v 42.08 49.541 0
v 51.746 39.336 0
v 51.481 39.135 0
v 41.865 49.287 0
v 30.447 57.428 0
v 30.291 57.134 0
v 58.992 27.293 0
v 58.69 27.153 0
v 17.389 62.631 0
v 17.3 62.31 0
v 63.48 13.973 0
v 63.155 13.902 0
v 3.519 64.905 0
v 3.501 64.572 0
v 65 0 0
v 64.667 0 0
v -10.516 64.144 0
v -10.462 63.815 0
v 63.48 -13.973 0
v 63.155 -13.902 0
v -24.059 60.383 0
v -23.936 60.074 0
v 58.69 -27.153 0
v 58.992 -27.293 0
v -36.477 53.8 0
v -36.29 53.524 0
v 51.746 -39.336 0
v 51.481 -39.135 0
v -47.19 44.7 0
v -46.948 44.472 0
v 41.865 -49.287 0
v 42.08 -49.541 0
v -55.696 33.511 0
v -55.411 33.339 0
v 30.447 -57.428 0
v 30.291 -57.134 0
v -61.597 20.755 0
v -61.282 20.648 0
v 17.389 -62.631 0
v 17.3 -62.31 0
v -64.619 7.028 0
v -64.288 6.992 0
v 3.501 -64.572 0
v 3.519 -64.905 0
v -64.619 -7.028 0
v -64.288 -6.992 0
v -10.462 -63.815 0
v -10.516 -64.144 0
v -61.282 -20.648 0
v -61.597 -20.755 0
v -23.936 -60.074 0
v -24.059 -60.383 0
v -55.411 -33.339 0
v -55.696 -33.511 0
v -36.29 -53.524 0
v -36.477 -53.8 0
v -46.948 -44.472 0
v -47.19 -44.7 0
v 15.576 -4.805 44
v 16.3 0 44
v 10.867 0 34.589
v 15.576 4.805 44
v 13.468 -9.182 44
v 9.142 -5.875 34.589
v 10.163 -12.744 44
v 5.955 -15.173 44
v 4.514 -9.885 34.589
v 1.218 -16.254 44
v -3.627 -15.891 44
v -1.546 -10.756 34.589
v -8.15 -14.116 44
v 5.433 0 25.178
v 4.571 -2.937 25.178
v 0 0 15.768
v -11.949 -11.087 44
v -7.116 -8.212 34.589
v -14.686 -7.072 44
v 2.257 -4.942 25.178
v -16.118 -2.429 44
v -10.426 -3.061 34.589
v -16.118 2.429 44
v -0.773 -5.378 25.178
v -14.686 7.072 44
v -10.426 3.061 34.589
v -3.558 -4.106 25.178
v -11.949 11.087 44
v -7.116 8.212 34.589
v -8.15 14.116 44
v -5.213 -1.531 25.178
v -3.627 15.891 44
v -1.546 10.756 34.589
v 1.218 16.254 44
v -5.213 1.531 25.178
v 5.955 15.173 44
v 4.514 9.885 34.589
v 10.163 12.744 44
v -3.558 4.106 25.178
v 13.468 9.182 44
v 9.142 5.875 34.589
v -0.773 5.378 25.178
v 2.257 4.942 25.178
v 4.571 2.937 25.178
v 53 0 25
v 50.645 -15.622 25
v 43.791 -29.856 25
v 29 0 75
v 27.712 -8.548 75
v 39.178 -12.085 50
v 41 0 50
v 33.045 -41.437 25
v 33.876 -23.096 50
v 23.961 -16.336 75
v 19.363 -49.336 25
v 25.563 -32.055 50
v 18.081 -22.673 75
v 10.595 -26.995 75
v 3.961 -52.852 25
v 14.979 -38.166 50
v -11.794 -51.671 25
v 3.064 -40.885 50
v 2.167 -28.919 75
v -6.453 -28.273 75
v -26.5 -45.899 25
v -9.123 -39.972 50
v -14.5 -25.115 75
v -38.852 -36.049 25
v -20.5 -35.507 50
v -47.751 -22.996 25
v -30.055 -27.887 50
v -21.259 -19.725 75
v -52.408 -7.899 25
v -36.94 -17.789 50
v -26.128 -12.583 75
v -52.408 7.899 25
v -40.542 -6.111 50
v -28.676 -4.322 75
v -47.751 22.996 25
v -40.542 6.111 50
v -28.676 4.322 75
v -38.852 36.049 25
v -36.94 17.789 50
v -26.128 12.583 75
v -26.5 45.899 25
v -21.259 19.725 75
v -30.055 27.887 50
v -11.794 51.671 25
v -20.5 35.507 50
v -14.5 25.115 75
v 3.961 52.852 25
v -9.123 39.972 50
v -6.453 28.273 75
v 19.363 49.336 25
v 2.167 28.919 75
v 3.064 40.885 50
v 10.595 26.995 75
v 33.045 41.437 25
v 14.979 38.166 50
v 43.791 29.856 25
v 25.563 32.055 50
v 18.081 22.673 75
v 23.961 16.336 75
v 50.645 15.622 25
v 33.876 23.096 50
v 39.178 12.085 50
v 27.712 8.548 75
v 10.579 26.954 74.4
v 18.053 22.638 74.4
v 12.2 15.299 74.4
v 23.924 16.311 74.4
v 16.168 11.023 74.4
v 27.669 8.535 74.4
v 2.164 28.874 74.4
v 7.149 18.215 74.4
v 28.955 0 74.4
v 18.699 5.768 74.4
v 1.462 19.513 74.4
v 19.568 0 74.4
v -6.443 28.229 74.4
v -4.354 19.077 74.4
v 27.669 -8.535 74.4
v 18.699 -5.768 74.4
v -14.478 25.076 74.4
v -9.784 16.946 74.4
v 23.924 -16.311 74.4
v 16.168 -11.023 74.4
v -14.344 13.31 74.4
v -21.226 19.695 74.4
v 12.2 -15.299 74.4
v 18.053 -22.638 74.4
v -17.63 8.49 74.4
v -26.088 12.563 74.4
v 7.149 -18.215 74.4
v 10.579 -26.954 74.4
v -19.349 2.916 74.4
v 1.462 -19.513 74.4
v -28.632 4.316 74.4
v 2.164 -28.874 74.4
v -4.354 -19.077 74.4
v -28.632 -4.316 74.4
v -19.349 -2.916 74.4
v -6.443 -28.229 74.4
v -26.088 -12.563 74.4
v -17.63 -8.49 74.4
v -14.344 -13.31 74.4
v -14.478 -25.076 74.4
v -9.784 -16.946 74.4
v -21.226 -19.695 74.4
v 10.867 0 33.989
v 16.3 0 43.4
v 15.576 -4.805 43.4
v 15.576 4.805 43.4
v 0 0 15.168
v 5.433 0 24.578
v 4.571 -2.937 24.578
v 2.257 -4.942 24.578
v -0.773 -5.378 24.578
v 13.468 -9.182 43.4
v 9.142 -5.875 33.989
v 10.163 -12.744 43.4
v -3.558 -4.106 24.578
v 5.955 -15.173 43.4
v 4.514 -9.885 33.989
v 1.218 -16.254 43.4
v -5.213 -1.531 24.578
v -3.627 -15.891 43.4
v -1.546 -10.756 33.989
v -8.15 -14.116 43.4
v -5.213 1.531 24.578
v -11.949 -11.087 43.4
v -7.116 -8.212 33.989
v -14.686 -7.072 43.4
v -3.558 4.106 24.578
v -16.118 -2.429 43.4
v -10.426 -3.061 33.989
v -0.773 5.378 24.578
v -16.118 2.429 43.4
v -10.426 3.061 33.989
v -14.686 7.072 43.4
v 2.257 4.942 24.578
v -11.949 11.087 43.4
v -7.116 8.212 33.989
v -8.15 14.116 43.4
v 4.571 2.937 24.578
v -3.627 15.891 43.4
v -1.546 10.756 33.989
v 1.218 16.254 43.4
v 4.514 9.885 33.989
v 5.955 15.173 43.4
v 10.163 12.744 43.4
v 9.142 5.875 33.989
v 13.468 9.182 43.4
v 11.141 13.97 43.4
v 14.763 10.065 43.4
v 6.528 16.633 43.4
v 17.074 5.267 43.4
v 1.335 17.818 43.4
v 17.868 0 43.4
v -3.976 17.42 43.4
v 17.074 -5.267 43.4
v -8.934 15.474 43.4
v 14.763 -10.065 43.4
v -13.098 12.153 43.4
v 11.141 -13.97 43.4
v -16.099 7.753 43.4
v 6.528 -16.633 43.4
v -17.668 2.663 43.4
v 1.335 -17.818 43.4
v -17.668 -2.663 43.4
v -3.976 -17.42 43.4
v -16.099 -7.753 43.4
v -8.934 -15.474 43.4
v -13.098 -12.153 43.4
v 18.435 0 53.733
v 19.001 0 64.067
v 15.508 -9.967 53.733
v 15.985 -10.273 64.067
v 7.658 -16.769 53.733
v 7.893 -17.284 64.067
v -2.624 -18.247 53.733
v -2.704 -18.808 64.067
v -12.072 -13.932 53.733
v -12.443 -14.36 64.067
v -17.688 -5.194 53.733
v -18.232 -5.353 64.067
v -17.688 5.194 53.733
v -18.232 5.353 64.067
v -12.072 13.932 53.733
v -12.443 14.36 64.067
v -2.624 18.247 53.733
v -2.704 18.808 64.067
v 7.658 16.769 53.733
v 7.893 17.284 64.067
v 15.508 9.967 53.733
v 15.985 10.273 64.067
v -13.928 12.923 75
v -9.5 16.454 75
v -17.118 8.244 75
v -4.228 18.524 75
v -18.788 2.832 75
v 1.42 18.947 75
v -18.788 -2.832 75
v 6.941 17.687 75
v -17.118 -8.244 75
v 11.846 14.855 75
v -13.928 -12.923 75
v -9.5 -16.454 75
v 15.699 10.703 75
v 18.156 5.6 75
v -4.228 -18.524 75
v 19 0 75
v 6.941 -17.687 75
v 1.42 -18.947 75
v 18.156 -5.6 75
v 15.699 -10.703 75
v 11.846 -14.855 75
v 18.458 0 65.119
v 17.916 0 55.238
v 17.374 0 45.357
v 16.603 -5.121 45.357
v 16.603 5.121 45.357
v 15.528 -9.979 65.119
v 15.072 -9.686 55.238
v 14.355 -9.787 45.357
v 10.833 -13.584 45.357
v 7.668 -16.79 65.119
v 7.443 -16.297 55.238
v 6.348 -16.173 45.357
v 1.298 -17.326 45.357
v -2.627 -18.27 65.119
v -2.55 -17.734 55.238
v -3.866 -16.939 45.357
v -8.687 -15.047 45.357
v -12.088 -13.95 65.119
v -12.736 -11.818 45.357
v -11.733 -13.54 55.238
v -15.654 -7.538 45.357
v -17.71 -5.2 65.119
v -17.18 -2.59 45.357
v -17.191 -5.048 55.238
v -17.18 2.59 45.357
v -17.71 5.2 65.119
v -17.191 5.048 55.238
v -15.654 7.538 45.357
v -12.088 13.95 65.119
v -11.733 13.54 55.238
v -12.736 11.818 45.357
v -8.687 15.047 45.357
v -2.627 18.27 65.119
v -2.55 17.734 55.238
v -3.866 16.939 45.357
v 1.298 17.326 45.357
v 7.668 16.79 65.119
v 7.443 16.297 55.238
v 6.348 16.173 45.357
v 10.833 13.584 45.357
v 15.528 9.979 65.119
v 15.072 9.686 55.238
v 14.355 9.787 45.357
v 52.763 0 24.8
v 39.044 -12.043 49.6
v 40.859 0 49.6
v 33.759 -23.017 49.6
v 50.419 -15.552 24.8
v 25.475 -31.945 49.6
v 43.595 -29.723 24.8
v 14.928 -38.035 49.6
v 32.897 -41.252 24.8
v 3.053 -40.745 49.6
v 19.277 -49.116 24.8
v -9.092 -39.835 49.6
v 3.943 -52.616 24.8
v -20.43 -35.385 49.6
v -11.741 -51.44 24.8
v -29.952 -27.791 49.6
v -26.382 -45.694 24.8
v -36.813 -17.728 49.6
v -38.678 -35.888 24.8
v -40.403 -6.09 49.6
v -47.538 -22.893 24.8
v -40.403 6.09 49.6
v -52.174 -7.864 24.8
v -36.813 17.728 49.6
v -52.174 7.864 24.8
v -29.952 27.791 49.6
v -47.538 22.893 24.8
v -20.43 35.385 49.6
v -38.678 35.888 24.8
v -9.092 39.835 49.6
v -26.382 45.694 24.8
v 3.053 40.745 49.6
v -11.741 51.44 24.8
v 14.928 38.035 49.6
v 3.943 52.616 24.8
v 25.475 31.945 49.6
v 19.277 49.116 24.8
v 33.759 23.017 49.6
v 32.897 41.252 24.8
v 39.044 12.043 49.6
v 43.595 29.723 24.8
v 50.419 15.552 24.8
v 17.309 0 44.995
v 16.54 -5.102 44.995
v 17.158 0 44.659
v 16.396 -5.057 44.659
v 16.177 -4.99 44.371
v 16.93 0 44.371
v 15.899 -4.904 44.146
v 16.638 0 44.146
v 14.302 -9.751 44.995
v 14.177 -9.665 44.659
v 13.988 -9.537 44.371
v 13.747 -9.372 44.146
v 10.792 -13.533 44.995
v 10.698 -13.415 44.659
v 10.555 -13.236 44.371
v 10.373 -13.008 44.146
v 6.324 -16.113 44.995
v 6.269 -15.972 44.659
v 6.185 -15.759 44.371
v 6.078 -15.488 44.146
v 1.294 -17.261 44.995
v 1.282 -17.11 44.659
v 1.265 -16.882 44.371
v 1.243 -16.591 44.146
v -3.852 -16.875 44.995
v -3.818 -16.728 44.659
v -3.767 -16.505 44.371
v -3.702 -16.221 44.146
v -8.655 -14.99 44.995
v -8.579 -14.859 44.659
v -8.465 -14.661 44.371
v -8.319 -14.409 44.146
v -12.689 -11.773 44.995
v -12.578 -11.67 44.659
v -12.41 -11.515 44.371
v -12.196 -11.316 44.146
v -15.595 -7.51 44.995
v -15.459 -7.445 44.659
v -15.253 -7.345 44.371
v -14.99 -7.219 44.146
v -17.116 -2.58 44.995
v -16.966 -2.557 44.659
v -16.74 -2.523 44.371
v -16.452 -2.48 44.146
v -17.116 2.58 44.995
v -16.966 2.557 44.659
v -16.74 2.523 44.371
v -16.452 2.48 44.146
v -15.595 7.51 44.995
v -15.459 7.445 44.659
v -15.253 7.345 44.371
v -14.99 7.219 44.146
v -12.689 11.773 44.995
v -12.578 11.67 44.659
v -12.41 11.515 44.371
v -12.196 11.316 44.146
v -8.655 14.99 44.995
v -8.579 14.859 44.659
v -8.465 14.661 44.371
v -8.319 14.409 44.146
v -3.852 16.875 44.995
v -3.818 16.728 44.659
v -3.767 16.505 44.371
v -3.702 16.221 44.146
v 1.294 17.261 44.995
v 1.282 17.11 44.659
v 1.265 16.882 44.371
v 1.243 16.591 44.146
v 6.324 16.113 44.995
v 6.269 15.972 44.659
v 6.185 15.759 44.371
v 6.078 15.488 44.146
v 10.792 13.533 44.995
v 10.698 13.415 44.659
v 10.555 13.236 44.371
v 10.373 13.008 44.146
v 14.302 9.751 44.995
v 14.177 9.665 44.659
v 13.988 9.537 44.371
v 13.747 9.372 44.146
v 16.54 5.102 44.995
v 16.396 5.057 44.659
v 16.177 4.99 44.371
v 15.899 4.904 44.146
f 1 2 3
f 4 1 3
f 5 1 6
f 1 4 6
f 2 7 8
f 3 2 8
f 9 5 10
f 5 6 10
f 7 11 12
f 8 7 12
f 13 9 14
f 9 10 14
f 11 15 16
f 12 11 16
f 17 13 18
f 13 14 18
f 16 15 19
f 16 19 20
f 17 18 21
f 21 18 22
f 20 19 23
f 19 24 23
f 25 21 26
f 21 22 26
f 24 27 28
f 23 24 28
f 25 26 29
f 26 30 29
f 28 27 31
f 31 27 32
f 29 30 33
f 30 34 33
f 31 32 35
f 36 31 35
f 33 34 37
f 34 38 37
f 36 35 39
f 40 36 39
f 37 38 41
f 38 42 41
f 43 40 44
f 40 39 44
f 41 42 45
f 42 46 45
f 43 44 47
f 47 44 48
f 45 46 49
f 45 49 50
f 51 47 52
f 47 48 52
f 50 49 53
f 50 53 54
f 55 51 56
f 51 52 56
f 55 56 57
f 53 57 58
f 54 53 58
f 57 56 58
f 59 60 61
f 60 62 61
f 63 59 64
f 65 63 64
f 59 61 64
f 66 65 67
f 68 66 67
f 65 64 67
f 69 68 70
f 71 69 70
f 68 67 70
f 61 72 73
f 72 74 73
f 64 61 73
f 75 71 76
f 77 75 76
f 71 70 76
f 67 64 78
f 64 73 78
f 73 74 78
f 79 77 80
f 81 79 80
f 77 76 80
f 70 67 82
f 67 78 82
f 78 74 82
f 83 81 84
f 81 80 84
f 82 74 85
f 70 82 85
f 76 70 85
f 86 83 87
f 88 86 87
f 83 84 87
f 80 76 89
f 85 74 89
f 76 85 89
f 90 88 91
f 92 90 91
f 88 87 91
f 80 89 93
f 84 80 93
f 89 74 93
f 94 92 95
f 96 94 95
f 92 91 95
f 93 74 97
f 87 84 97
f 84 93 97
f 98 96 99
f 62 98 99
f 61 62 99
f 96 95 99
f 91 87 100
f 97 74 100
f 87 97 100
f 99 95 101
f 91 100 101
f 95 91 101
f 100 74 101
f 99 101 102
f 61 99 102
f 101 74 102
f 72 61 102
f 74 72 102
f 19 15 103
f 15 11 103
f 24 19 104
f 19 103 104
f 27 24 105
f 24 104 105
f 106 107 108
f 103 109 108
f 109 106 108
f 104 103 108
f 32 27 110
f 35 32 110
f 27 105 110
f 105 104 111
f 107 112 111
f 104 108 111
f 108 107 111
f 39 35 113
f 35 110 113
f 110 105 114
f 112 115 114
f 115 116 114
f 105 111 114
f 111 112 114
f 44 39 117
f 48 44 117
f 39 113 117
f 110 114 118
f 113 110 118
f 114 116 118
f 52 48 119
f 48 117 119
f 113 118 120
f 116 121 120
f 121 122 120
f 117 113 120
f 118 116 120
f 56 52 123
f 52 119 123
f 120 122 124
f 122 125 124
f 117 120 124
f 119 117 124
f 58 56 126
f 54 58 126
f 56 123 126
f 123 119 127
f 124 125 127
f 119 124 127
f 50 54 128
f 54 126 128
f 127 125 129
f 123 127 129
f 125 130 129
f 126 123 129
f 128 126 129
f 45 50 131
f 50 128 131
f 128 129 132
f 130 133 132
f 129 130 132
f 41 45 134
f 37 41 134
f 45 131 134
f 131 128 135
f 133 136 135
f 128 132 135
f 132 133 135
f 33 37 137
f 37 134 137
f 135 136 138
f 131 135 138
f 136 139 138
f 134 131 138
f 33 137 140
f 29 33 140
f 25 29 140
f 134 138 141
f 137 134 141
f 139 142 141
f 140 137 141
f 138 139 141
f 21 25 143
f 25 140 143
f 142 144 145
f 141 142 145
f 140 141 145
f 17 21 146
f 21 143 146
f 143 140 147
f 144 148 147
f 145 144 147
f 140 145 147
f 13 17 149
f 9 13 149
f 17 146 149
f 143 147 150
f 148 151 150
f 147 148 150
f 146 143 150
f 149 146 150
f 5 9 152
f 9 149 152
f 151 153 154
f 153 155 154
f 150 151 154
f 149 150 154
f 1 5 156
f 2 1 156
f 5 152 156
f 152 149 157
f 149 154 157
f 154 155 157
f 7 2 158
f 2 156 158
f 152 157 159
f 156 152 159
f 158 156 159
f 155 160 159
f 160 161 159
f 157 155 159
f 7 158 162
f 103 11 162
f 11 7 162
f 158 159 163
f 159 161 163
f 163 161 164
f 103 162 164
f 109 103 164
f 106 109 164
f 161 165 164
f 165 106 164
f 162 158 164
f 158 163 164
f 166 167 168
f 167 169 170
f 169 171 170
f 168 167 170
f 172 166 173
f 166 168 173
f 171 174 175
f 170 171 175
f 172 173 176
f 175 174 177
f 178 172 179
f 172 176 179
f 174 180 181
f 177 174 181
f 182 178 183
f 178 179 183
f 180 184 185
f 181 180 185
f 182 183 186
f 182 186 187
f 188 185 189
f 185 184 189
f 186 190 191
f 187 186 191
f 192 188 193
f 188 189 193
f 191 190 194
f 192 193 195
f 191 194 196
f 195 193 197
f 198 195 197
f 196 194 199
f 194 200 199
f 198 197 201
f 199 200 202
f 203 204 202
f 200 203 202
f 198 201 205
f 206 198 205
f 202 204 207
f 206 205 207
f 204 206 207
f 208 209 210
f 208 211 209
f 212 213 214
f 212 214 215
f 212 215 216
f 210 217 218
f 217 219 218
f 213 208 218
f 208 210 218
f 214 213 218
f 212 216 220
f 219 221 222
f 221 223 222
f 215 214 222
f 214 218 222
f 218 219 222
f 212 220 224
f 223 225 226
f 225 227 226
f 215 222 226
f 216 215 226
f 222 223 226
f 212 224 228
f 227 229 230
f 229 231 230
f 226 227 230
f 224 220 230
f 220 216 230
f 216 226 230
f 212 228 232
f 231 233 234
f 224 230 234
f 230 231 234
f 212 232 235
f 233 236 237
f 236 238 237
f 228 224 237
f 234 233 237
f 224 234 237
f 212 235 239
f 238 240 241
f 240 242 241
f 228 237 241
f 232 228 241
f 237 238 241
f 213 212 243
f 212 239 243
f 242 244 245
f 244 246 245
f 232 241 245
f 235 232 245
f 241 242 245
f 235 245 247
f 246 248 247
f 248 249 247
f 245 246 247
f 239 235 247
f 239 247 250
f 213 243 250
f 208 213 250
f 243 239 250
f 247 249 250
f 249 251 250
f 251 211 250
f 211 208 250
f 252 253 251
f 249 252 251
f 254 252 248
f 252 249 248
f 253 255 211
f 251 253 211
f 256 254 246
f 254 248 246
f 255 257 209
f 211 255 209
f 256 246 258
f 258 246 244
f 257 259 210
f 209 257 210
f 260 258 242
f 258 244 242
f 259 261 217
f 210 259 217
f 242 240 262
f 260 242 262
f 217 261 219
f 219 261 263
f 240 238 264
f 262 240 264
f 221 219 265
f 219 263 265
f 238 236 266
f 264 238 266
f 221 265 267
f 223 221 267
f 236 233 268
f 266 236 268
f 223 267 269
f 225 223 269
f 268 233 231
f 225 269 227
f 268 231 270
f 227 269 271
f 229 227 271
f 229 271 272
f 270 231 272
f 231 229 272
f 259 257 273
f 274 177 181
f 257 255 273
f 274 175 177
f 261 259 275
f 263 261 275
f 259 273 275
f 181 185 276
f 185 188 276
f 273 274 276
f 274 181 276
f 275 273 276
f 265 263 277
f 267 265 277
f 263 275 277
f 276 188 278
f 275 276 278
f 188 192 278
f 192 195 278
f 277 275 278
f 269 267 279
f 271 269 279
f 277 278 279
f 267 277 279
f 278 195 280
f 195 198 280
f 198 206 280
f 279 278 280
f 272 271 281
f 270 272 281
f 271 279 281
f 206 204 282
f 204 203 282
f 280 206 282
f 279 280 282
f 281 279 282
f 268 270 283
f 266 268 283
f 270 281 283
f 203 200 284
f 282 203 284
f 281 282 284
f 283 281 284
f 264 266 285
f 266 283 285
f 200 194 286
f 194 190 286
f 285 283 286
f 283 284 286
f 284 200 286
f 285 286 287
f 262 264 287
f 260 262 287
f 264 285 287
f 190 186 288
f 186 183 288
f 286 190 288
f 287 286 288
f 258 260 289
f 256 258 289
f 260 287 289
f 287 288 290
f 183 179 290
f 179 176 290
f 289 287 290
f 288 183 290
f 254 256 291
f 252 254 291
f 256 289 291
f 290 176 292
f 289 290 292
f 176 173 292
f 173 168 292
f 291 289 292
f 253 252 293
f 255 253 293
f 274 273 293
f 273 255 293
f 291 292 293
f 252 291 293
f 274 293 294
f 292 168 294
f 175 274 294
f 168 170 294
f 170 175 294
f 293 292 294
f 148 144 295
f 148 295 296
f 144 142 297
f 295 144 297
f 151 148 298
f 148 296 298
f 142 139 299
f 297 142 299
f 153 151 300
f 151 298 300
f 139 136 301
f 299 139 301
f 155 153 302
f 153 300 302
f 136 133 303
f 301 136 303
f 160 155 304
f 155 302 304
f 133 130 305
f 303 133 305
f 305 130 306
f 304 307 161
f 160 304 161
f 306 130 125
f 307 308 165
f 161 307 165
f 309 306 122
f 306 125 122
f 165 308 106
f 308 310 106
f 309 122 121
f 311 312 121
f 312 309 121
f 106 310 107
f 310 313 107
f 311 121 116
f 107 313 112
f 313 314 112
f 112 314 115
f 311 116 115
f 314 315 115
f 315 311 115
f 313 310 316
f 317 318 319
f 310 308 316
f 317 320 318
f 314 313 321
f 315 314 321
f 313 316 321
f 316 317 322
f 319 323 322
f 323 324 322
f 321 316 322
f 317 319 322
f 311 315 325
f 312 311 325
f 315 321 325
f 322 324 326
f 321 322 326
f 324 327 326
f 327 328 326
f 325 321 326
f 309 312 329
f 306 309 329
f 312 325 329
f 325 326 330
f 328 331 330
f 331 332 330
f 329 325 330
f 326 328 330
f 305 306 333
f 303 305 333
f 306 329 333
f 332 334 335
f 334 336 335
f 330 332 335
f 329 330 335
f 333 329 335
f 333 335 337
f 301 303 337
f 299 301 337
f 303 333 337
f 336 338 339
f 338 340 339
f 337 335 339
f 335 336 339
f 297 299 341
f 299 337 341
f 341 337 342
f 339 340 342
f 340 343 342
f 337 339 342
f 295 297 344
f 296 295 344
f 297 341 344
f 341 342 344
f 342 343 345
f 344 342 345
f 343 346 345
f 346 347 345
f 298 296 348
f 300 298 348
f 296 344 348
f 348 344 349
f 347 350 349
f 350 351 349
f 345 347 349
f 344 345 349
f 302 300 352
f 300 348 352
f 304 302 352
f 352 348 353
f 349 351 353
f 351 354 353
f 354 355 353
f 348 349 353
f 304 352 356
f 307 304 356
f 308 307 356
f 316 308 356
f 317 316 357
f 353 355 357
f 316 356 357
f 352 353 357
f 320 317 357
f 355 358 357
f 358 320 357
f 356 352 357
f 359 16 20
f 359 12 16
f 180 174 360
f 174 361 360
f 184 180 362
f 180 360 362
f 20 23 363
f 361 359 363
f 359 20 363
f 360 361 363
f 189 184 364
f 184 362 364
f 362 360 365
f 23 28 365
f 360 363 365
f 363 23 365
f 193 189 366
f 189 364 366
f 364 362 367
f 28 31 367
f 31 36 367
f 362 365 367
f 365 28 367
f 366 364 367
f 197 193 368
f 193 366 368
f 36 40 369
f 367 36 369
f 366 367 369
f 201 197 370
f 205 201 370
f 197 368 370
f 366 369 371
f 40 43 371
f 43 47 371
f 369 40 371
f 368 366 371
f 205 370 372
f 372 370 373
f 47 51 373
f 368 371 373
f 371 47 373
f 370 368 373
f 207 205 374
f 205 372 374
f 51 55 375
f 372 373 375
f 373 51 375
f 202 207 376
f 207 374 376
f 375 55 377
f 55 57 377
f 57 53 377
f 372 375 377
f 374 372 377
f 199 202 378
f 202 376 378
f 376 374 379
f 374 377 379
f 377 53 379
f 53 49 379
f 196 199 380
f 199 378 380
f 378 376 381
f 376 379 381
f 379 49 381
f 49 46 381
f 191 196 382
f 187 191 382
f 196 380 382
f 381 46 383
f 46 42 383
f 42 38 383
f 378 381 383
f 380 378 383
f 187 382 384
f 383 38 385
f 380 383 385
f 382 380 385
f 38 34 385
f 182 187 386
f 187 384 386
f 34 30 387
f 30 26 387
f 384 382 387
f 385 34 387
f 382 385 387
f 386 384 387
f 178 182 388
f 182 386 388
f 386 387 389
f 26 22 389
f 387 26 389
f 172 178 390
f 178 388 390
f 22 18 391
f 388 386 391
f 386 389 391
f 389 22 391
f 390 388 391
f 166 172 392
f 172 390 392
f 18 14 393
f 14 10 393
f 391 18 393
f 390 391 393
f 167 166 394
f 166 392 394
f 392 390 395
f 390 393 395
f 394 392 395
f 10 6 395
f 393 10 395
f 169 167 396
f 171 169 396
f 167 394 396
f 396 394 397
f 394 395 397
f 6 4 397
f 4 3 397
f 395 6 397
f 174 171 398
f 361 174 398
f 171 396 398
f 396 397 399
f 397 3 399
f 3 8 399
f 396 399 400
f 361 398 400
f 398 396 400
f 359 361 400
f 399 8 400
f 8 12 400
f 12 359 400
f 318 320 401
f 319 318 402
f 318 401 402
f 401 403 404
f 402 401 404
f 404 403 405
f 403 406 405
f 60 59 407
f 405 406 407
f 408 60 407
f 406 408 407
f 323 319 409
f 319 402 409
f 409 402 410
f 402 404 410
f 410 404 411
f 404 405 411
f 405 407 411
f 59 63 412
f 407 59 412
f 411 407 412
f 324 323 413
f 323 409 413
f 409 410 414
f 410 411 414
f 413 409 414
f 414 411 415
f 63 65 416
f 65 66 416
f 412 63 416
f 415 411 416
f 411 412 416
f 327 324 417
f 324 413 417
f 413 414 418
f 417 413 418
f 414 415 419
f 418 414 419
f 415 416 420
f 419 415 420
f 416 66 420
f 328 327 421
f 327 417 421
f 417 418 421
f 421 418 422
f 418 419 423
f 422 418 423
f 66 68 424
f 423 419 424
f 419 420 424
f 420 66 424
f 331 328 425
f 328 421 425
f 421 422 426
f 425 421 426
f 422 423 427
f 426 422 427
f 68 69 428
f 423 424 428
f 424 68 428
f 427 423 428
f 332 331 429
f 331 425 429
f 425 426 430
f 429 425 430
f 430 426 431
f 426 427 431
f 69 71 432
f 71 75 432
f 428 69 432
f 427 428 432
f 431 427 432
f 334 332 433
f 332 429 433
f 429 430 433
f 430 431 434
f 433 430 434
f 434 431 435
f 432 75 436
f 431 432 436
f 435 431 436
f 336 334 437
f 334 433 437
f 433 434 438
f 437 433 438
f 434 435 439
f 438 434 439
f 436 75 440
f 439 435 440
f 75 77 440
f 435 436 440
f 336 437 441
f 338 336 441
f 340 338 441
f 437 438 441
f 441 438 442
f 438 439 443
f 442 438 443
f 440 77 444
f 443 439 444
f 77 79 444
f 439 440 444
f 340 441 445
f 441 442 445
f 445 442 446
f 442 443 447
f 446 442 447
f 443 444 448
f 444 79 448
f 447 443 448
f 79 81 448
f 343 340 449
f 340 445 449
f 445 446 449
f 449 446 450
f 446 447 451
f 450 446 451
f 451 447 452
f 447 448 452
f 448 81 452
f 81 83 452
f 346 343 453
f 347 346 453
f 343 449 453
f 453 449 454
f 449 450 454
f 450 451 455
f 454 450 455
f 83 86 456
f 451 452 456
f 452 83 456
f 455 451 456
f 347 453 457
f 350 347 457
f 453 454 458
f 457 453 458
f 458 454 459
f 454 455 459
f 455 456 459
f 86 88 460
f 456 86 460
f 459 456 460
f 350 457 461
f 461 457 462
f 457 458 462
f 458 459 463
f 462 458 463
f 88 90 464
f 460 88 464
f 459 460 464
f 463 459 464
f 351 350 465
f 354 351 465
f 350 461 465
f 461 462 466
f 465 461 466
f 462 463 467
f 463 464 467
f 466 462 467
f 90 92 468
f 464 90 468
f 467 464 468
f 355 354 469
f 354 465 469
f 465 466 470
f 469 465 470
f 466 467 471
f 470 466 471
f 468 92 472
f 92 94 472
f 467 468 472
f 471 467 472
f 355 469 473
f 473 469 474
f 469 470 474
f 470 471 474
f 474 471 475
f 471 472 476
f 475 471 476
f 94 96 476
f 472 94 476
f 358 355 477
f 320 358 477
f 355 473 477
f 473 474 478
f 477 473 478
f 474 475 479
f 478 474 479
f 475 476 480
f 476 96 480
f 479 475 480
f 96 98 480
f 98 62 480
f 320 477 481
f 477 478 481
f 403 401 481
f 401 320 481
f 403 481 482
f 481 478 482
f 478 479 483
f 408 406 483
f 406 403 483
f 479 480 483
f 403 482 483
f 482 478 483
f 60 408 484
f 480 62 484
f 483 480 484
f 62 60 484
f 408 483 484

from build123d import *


# Not quite as in the source:
# - a fillet or chamfer that OpenCascade refuses, or shapes differently, is made with other operations: its cross-section is extruded or revolved along the edge and cut away or added


with BuildPart() as f1:
    # F0 (on Front) → F1 (revolve)
    with BuildSketch(Plane.XZ):
        Polygon((64.667229809, 0), (65, 0), (29, 75), (19, 75), (17.3, 44), (16.3, 44), (0, 15.7675718366), (0, 15.1675718366), (16.3, 43.4), (17.8679982822, 43.4), (19.5679982822, 74.4), (28.955229809, 74.4), align=None)
    revolve(axis=Axis((0, 0, 43.4963169246), (0, 0, -1)))

    # F2: fillet of radius 1.5 on 1 edges, made by hand

    # F2_s1 → F2_t2 (revolve)
    with BuildSketch(Plane.XZ):
        with BuildLine():
            ThreePointArc((17.3744099359, 45.3568870669), (17.0526414639, 44.5078566678), (16.3, 44))
            Line((16.3, 44), (16.3084667935, 43.9712195655))
            ThreePointArc((16.3084667935, 43.9712195655), (16.8, 43.97), (17.3, 43.97))
            Line((17.3, 43.97), (17.3299549922, 43.9983573069))
            Line((17.3299549922, 43.9983573069), (17.4043649282, 45.3552443738))
            Line((17.4043649282, 45.3552443738), (17.3744099359, 45.3568870669))
        make_face()
    revolve(axis=Axis((0, 0, 44), (0, 0, -1)))


solid = f1.part
